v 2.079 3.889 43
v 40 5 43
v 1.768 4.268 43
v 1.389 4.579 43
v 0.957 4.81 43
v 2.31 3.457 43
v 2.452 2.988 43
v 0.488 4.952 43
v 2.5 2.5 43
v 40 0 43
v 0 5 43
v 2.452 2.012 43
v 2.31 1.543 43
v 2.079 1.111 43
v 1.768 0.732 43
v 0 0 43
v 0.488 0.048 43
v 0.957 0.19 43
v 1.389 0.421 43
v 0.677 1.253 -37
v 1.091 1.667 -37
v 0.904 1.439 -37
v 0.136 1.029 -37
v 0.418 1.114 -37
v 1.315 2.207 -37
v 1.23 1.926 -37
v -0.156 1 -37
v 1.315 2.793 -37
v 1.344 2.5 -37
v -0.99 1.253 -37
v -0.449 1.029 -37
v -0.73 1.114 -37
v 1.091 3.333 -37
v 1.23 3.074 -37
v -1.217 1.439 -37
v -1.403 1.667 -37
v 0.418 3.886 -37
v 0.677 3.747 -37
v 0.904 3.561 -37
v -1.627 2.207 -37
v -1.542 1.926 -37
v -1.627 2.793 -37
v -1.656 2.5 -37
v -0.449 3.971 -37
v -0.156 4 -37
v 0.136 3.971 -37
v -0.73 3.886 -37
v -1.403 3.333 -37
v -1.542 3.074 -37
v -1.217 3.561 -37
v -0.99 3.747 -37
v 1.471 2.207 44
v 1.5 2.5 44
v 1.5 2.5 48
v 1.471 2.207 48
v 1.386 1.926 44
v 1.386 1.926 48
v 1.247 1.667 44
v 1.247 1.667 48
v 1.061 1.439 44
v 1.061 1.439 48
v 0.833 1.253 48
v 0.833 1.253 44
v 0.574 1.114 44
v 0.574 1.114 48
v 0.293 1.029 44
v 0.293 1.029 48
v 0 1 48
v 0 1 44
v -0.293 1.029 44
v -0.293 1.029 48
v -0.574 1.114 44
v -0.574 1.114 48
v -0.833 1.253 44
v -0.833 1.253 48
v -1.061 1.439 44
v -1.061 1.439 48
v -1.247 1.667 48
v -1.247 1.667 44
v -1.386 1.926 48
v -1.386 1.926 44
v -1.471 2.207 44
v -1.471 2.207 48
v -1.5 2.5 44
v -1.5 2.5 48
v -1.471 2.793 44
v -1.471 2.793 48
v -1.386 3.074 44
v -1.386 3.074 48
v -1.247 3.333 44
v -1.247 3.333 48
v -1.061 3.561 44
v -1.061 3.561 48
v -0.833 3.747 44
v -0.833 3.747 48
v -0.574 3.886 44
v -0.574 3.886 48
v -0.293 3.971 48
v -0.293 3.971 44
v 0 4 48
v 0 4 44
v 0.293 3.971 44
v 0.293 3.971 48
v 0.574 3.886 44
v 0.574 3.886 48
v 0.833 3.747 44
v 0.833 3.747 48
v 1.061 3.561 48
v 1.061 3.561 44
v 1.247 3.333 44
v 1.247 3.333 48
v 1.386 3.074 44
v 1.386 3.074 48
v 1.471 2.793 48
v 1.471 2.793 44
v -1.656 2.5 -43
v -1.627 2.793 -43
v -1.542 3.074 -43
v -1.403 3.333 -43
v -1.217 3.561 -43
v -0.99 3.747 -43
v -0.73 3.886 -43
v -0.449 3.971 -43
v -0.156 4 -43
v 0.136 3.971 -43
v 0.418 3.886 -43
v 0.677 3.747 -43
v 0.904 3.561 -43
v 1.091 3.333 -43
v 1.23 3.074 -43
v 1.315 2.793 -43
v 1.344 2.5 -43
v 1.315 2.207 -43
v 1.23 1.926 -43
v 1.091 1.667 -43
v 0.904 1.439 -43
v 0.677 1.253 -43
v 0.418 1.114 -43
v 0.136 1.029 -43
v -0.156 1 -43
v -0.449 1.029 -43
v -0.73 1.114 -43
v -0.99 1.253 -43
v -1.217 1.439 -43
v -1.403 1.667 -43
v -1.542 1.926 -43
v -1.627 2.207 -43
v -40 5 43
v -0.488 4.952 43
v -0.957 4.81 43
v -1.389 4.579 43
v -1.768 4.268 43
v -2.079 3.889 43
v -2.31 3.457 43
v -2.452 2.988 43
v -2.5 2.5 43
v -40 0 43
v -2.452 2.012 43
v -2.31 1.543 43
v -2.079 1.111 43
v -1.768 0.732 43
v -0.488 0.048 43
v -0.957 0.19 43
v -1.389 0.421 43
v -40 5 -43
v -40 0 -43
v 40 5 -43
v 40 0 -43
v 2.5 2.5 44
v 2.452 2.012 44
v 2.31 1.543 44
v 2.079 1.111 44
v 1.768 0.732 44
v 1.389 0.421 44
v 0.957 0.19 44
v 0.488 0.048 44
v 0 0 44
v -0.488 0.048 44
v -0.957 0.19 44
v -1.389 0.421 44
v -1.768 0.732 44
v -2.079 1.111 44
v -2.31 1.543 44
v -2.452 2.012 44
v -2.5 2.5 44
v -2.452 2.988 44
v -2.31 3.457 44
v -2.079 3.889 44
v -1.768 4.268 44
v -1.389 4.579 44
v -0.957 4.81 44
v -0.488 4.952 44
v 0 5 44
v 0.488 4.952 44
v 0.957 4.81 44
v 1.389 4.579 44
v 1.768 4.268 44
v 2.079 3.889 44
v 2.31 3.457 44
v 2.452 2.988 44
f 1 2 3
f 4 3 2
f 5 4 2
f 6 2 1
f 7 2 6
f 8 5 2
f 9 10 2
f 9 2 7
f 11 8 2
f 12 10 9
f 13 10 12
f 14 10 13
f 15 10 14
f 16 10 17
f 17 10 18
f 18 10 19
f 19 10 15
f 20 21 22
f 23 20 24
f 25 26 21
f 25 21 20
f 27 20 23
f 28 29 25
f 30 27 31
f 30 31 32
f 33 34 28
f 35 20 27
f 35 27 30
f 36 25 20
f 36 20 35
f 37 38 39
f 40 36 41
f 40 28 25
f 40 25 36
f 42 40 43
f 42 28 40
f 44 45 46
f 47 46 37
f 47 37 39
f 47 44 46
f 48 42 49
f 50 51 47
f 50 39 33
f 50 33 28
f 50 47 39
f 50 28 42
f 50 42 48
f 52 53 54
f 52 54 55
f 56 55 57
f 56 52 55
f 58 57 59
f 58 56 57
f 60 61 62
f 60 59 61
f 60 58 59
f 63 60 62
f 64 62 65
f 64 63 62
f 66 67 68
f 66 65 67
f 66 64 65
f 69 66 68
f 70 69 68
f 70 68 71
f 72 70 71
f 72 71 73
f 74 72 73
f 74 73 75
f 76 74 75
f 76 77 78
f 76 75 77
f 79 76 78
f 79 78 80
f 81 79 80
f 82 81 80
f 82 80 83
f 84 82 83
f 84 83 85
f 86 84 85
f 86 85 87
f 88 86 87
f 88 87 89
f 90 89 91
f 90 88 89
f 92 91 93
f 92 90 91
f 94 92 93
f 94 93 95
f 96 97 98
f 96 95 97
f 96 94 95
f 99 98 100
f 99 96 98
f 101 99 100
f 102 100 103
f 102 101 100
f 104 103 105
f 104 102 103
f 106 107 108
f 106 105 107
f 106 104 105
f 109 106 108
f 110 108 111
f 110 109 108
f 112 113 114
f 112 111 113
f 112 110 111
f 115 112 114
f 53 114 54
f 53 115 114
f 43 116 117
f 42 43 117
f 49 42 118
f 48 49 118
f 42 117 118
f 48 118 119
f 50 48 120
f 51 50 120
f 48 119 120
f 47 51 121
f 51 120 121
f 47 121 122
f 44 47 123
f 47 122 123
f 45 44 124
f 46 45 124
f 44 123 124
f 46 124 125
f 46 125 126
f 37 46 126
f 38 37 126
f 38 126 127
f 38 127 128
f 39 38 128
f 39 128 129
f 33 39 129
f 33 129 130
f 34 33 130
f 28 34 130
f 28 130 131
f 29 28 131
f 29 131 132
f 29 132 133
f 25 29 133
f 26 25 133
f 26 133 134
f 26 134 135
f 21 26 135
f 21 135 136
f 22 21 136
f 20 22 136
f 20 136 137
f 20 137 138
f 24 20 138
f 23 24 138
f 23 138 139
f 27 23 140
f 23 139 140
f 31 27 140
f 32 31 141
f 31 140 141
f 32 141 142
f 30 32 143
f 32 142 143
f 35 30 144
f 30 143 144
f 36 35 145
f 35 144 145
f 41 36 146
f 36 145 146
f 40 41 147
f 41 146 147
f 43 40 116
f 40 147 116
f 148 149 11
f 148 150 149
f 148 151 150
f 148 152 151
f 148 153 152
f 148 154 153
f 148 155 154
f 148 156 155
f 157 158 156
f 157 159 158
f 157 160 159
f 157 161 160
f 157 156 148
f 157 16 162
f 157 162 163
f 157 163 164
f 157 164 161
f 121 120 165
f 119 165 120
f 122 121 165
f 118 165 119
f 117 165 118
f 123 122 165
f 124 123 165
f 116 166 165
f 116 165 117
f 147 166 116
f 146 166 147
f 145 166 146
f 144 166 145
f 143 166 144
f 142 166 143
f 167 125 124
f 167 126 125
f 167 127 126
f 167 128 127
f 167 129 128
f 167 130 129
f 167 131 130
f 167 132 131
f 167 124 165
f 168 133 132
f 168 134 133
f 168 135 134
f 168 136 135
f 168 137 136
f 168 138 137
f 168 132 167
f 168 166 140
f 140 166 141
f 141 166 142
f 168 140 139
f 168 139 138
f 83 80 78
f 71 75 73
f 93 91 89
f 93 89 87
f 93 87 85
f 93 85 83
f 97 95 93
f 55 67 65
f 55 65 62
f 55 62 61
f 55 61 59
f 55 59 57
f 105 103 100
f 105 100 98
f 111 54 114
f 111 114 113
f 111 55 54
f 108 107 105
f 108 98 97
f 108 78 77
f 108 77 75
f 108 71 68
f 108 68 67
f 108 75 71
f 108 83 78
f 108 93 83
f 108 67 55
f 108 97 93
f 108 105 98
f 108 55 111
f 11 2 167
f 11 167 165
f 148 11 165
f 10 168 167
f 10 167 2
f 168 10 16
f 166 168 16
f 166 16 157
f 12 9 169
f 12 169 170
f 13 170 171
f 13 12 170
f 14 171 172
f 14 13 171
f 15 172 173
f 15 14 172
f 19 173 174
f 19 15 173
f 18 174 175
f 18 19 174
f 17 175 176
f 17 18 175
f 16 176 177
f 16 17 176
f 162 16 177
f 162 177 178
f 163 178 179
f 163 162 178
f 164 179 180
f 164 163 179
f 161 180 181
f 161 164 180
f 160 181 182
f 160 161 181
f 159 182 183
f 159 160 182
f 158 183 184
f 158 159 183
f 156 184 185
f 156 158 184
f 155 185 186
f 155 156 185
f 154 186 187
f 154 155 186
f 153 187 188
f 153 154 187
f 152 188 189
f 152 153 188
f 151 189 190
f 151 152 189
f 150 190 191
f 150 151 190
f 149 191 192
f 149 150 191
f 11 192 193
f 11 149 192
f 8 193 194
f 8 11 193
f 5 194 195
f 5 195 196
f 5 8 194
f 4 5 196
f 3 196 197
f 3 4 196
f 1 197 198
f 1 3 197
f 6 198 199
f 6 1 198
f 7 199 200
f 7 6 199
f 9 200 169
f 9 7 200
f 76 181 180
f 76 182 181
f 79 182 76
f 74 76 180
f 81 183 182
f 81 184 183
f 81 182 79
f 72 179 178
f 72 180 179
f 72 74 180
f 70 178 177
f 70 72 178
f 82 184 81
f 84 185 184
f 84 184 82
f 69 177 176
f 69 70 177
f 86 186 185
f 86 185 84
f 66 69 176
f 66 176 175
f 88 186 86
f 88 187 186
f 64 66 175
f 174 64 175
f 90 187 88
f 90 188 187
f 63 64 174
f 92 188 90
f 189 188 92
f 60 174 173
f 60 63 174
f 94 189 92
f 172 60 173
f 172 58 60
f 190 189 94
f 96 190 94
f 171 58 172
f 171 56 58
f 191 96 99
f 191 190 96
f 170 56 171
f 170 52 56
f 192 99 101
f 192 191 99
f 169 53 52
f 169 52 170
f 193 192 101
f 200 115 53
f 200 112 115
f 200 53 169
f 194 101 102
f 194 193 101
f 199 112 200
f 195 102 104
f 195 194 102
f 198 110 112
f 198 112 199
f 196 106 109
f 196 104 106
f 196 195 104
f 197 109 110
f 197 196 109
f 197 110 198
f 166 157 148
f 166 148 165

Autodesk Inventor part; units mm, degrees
ref_plane "YZ Plane" through (0, 0, 0) normal (1, 0, 0) x (0, 1, 0)
ref_plane "XZ Plane" through (0, 0, 0) normal (0, 1, 0) x (-1, 0, 0)
ref_plane "XY Plane" through (0, 0, 0) normal (0, 0, 1) x (1, 0, 0)
sketch "Sketch1" plane through (0, 0, 0) normal (0, 1, 0) x (-1, 0, 0)
  line L0 (40, 43) -> (40, -43)
  line L1 (40, -43) -> (-40, -43)
  line L2 (-40, -43) -> (-40, 43)
  line L3 (-40, 43) -> (40, 43)
  line L4 (40, 43) -> (-40, -43) construction
  line L5 (40, -43) -> (-40, 43) construction
  point P0 (0, 0)
  dimension "d0" = 86
  dimension "d1" = 80
extrude "Extrusion1" add sketch "Sketch1" along normal blind 5
sketch "Sketch2" plane through (40, 0, -43) normal (0, 0, -1) x (-1, 0, 0)
  line L0 (0, 0) -> (80, 0) projected
  line L1 (80, 0) -> (80, 5) projected
  line L2 (0, 5) -> (80, 5) projected
  line L3 (0, 0) -> (0, 5) projected
  circle A0 centre (40.1562, 2.5) radius 1.5
  dimension "d4" = 3
extrude "Extrusion2" cut sketch "Sketch2" against normal blind 6 contours A0
sketch "Sketch3" plane through (-40, 0, 43) normal (0, 0, 1) x (1, 0, 0)
  line L0 (0, 0) -> (80, 0) projected
  line L1 (80, 0) -> (80, 5) projected
  line L2 (0, 5) -> (80, 5) projected
  line L3 (0, 0) -> (0, 5) projected
  circle A0 centre (40, 2.5) radius 2.5
  dimension "d7" = 5
extrude "Extrusion3" add sketch "Sketch3" along normal blind 1 contours A0
sketch "Sketch4" plane through (0, 2.5, 44) normal (0, 0, 1) x (1, 0, 0)
  circle A0 centre (0, 0) radius 1.5
  dimension "d10" = 3
extrude "Extrusion4" add sketch "Sketch4" along normal blind 4
properties part number "brush"
